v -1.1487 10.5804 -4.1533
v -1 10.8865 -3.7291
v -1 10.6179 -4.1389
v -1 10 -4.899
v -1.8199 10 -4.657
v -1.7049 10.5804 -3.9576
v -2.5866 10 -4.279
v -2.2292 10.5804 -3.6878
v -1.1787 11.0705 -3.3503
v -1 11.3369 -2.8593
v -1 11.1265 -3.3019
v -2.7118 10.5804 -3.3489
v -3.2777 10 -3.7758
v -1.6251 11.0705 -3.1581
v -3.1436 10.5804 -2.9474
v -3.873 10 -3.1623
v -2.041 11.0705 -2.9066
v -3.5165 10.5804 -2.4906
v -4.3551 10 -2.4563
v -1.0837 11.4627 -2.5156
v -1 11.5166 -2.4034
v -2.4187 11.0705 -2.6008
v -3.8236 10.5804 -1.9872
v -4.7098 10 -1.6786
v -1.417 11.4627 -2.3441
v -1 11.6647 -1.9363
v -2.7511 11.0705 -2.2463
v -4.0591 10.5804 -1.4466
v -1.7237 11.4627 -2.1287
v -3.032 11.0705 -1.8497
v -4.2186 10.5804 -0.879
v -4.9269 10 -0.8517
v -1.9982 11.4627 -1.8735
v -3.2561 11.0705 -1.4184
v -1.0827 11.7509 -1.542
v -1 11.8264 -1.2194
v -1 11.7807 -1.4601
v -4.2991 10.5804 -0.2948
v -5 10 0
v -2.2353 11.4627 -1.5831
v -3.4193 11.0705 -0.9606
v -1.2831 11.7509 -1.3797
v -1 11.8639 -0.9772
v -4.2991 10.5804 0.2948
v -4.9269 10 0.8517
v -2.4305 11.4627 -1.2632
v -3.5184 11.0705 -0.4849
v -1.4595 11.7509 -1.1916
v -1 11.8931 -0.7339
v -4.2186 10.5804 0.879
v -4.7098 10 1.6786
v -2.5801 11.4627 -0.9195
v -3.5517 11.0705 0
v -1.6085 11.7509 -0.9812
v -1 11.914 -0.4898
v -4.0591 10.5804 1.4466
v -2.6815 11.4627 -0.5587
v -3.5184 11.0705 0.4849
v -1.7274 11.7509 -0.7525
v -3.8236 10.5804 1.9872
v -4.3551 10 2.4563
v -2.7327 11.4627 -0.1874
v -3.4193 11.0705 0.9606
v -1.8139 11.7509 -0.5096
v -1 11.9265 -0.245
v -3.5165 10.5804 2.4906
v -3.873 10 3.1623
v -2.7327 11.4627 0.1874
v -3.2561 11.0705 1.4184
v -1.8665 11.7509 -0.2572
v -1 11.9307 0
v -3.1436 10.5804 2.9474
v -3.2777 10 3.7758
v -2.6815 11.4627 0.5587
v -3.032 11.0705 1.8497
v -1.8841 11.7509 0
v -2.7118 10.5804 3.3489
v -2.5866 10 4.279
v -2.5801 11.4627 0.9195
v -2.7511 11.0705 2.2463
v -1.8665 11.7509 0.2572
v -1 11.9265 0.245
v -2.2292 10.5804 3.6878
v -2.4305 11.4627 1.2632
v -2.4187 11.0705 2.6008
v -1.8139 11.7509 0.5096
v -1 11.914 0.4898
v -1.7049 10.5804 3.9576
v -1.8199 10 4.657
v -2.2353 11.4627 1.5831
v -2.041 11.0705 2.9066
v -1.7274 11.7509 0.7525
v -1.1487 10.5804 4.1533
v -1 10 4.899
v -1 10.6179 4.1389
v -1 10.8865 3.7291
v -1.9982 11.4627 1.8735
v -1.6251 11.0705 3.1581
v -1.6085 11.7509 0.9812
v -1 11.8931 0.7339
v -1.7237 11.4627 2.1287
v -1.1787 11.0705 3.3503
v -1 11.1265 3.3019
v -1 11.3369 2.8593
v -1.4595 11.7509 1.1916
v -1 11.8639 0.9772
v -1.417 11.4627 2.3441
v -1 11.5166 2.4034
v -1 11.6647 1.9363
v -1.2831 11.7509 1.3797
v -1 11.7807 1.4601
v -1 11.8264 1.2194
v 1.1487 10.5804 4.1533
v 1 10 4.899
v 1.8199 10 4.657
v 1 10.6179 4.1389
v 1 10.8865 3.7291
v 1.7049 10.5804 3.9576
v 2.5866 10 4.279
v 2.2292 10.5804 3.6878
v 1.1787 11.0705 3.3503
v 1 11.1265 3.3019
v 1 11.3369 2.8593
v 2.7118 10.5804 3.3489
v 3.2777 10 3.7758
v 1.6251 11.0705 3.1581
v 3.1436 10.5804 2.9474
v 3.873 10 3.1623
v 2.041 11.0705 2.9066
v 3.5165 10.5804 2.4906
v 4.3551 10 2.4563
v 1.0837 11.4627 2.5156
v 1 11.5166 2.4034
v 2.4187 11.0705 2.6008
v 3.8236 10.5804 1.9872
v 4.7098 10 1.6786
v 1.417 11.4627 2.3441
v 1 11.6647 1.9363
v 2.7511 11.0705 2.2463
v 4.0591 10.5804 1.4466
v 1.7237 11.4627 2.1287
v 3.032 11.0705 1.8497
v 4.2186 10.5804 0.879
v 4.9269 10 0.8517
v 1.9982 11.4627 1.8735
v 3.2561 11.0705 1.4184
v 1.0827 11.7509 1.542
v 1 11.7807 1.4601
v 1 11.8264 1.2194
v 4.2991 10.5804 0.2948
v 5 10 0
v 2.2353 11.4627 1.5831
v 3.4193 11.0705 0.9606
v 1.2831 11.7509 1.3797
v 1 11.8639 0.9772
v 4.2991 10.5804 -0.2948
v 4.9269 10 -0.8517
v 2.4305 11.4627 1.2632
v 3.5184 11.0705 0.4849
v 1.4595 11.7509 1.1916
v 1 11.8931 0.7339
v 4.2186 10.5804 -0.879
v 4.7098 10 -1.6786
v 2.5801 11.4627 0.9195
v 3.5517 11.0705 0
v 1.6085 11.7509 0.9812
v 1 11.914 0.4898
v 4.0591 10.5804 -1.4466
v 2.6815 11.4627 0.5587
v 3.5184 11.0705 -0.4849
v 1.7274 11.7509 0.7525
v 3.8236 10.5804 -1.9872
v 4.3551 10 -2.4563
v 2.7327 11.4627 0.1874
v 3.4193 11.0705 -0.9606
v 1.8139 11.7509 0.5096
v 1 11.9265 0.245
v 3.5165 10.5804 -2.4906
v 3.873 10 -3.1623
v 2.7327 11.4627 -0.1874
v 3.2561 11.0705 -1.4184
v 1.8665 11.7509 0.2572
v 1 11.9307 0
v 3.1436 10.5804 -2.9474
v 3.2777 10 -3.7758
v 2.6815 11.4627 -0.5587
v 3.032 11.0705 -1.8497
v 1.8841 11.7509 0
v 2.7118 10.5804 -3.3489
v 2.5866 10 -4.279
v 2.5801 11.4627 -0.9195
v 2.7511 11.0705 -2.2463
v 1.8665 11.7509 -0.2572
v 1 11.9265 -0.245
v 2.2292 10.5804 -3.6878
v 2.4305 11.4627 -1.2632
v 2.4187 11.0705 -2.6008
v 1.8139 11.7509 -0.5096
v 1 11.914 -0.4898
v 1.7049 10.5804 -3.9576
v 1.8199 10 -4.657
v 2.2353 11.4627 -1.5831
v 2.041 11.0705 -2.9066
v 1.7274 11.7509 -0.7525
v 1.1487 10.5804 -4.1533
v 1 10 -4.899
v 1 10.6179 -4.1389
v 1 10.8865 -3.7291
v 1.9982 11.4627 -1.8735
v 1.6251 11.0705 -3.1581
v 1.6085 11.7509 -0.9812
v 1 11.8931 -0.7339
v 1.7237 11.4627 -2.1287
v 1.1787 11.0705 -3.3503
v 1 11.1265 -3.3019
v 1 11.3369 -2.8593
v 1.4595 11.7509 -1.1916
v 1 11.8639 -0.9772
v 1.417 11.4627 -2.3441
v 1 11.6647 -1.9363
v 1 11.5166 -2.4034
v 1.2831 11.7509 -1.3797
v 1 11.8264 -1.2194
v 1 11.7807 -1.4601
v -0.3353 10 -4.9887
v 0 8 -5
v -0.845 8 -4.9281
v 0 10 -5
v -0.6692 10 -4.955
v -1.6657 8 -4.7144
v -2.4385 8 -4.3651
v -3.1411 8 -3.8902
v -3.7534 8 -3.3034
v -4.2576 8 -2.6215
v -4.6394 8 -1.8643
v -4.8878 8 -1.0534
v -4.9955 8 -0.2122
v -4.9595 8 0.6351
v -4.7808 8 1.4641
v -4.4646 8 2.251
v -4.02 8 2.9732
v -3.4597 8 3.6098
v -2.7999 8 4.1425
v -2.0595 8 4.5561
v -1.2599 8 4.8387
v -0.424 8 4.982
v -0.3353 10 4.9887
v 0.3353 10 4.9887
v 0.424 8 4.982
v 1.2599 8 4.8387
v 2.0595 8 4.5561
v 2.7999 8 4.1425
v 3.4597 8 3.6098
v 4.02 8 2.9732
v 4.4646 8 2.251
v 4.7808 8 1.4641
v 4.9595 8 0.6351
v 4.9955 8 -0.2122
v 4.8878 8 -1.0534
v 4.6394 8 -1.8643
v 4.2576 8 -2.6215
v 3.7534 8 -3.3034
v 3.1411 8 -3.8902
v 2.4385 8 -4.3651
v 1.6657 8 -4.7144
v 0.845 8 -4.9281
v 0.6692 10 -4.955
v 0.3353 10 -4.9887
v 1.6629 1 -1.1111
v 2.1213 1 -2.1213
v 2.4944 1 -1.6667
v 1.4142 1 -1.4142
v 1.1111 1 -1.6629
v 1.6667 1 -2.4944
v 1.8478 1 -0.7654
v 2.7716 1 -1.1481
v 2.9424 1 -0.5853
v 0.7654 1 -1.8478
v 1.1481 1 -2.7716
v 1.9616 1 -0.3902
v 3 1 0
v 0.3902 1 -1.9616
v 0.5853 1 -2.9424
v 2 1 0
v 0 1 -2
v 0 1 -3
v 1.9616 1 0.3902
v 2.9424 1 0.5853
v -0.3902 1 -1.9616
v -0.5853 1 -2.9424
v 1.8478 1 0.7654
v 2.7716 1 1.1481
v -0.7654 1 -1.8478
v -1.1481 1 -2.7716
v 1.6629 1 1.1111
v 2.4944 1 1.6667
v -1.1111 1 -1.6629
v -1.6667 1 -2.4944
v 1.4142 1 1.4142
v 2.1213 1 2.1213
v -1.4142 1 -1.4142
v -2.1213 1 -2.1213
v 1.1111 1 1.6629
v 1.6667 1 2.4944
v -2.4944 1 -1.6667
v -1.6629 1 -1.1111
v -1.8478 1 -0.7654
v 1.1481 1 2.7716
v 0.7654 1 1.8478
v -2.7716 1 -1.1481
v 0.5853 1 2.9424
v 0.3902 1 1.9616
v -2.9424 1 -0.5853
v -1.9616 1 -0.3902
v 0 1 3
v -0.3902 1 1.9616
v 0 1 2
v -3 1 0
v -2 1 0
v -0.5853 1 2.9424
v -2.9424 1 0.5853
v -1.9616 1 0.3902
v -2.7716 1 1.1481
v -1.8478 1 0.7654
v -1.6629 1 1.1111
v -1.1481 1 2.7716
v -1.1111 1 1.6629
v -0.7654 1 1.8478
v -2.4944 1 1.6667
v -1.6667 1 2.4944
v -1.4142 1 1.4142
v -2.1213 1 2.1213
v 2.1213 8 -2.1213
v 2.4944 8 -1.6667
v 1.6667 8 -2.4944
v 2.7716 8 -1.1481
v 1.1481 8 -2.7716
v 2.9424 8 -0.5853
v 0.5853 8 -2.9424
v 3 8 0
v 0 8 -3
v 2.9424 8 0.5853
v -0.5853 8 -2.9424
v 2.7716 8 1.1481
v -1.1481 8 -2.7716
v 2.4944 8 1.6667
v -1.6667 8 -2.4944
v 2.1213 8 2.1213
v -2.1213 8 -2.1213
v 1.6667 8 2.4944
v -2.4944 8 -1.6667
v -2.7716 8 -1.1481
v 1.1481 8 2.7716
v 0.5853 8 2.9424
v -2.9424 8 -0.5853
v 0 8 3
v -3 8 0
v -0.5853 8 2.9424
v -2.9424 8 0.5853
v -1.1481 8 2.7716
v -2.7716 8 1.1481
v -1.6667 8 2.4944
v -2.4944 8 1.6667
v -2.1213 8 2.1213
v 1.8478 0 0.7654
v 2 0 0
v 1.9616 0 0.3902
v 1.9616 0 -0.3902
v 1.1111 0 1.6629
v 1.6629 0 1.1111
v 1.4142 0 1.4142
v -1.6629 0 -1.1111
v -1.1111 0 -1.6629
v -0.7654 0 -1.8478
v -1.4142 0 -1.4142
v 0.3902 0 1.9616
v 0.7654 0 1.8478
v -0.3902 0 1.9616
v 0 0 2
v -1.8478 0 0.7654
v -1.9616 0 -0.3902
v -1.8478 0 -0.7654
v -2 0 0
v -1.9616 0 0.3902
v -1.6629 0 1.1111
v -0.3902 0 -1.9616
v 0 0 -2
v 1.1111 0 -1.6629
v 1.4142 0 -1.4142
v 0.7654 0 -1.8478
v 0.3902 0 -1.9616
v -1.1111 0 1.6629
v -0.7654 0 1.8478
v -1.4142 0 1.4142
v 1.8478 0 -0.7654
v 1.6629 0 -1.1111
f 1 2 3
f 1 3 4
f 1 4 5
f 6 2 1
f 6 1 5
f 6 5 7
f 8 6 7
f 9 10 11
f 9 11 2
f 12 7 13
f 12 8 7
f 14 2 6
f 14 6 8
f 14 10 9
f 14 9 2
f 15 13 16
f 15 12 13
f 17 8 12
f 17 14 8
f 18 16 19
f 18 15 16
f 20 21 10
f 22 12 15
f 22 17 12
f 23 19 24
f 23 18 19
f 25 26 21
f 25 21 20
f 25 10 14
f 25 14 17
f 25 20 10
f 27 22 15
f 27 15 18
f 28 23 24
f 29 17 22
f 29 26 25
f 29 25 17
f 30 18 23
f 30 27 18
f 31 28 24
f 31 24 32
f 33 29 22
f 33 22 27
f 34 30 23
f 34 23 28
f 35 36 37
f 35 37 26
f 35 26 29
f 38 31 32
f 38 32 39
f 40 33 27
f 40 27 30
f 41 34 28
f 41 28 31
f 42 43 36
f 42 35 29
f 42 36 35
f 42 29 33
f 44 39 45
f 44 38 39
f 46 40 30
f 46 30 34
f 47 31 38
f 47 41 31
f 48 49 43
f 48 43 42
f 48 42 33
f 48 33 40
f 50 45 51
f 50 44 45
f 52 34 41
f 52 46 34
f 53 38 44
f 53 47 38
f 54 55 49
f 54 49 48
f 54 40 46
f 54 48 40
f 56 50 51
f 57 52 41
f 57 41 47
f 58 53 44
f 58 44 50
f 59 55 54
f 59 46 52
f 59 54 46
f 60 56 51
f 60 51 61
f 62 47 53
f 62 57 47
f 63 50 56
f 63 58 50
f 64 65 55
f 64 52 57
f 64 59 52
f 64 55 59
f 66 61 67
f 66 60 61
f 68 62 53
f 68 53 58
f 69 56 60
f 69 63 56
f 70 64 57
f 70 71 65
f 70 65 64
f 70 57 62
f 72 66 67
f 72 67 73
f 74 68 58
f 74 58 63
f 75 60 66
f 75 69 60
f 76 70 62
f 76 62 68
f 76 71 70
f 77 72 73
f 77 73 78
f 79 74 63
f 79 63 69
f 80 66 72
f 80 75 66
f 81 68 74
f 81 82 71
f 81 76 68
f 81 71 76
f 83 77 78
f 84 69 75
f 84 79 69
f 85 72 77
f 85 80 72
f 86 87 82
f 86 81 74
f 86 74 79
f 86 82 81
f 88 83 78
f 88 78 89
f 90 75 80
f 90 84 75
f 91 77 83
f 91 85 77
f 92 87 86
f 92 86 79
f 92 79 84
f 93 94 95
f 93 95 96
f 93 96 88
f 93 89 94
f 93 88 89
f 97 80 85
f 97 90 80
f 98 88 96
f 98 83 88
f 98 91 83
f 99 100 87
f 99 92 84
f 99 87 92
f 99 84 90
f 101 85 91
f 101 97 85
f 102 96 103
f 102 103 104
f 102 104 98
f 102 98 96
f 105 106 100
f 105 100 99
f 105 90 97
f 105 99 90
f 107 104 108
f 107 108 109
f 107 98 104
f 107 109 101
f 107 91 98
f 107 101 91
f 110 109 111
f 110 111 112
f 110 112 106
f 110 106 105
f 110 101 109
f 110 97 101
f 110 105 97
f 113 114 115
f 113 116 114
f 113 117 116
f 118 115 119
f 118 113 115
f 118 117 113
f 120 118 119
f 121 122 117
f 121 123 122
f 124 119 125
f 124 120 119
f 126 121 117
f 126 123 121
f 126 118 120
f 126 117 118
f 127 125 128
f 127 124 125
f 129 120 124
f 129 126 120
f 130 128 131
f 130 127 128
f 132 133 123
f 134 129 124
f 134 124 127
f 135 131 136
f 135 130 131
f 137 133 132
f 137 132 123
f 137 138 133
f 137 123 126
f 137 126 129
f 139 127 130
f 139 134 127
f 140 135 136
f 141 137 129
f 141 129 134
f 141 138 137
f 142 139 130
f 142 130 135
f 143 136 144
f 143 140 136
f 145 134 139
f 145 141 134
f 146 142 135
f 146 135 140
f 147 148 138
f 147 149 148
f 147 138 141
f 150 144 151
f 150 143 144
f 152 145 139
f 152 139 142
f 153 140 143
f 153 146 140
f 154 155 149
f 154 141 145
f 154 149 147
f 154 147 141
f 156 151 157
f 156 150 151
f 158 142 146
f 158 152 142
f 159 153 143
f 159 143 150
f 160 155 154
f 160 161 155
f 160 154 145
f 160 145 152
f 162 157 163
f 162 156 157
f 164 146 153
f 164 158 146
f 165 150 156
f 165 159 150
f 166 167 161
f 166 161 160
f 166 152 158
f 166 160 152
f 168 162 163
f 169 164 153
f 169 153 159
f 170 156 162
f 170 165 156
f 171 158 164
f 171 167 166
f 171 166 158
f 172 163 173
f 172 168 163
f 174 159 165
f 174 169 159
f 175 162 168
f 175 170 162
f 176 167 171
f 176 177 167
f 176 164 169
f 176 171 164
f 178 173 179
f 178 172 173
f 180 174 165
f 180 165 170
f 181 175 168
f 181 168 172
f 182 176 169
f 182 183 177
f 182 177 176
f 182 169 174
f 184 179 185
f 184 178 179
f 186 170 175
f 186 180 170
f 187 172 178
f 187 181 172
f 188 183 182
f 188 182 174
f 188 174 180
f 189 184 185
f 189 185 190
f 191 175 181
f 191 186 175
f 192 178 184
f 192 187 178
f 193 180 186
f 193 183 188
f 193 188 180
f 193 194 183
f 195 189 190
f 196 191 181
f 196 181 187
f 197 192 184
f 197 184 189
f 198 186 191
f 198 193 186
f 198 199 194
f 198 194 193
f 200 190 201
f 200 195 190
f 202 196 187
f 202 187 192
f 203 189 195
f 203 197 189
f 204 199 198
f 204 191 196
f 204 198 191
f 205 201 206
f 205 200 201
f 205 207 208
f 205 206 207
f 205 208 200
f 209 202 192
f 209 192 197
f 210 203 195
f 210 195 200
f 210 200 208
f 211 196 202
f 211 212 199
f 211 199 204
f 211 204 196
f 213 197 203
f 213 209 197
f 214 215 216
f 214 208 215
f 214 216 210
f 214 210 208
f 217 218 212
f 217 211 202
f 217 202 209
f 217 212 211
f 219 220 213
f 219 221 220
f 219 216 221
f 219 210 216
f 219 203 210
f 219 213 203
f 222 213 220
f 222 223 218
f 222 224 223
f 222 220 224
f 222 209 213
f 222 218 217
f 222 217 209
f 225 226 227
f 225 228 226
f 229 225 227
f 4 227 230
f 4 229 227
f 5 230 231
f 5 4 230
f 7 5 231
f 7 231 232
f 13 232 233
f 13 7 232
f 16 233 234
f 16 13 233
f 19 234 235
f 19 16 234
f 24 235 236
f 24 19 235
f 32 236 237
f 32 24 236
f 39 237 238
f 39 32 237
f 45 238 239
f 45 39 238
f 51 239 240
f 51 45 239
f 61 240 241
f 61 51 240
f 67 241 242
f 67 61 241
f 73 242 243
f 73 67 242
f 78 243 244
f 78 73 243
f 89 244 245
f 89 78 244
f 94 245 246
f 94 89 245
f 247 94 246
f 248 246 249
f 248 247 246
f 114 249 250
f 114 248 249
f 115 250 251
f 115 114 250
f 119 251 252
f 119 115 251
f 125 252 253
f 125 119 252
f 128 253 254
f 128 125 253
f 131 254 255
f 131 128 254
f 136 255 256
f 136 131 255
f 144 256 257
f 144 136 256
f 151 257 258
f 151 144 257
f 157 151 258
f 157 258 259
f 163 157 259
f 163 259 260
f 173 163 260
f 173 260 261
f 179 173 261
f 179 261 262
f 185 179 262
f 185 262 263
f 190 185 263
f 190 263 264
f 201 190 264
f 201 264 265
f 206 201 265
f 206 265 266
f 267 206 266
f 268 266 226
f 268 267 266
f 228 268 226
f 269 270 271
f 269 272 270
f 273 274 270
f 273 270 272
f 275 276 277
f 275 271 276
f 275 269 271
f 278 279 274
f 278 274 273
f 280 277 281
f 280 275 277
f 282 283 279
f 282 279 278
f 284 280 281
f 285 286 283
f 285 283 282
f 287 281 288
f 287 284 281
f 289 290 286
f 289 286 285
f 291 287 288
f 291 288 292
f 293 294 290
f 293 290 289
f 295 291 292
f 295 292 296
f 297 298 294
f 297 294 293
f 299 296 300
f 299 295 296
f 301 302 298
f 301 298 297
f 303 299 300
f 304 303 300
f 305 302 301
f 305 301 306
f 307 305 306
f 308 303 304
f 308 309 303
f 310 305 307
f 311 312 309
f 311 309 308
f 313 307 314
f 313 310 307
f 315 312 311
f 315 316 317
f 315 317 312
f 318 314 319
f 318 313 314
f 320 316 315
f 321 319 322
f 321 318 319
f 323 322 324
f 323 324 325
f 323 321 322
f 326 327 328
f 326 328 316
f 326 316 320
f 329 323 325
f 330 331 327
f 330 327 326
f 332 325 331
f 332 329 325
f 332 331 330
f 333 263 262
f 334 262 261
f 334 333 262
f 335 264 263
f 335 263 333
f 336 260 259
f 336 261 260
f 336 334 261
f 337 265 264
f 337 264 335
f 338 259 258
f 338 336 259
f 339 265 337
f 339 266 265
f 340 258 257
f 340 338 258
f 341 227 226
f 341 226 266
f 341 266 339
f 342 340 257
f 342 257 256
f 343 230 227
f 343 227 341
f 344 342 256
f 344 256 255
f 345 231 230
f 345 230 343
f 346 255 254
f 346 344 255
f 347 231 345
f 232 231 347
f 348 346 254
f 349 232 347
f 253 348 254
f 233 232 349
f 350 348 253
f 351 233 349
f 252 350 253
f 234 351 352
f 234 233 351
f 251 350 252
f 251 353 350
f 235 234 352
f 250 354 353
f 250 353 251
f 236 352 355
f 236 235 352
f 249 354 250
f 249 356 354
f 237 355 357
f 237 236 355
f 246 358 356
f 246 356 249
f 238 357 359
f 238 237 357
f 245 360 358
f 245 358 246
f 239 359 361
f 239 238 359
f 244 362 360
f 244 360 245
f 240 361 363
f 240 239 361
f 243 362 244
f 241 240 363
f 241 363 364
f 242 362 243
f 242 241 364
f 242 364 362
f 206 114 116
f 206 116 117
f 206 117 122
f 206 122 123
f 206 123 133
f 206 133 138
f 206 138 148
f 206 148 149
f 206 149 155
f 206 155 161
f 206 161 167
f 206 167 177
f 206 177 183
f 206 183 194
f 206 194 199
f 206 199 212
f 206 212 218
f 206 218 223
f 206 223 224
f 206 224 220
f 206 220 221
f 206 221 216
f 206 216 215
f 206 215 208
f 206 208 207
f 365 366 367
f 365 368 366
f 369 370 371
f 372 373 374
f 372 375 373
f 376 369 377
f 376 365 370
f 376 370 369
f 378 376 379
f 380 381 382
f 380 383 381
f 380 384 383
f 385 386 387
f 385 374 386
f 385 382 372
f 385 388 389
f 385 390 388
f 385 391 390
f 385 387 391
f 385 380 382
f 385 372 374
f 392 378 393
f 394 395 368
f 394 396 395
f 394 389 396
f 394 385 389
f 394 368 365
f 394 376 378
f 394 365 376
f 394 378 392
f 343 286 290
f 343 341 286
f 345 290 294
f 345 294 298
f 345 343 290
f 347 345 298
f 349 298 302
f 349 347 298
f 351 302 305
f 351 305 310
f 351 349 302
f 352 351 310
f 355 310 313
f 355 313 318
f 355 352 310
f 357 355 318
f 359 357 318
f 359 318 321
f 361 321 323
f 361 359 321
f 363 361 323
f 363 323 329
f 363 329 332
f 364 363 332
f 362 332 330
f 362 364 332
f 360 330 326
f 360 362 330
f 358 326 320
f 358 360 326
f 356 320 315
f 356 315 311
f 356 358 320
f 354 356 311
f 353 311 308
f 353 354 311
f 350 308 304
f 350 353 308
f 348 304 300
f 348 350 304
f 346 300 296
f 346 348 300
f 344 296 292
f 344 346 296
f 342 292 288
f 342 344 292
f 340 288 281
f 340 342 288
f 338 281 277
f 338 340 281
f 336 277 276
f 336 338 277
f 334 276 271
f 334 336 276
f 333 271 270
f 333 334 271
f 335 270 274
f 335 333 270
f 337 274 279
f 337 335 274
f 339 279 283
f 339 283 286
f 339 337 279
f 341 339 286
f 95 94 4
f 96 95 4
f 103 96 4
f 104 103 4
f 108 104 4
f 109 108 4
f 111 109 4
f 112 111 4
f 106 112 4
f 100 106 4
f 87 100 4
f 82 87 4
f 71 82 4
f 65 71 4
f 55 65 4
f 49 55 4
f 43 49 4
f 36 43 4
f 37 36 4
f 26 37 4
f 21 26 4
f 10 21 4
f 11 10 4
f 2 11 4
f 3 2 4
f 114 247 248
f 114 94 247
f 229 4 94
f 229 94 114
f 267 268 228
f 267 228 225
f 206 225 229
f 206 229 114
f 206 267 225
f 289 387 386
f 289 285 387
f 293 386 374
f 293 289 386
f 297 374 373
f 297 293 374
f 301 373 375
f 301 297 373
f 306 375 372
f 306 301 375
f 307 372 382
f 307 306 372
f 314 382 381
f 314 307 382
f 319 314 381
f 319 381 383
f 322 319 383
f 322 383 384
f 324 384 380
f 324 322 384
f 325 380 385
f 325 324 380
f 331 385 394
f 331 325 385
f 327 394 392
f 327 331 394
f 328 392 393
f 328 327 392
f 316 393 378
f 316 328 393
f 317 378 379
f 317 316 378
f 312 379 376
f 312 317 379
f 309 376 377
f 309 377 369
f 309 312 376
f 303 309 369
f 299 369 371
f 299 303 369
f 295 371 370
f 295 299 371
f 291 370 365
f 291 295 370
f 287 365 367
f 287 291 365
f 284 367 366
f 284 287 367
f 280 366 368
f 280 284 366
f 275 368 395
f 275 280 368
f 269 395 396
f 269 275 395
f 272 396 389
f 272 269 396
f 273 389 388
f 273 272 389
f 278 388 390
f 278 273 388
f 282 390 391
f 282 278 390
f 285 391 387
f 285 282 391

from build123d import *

# Parameters (mm, degrees)
DOME4_FACE_RADIUS = 5
DOME4_HEIGHT      = 2
SKETCH3_W         = 2
SKETCH3_H         = 11.201368044
EXTRUDE3_DEPTH    = 2


with BuildPart() as part:
    # Sketch1 → Revolve3 (revolve)
    with BuildSketch(Plane.XY, mode=Mode.PRIVATE) as revolve3_sk:
        Polygon((0, 0), (-2, 0), (-2, 1), (-3, 1), (-3, 8), (-5, 8), (-5, 10), (0, 10), align=None)
    revolve(revolve3_sk.sketch.rotate(Axis((0, 0, 0), (0, 1, 0)), 270), axis=Axis((0, 0, 0), (0, 1, 0)))

    # Dome4: a dome of height H over a round flat face of radius A is a cap of a sphere of radius (A * A + H * H) / (2 * H)
    dome4_r = (DOME4_FACE_RADIUS * DOME4_FACE_RADIUS + DOME4_HEIGHT * DOME4_HEIGHT) / (2 * DOME4_HEIGHT)
    dome4_base = Plane((0, 10, 0), z_dir=(0, 1, 0))
    with Locations(dome4_base.offset(DOME4_HEIGHT - dome4_r)):
        dome4_ball = Sphere(dome4_r, mode=Mode.PRIVATE)
    add(split(dome4_ball, bisect_by=dome4_base, keep=Keep.TOP, mode=Mode.PRIVATE))

    # Sketch3 → Extrude3 (cut)
    with BuildSketch(Plane(origin=(0, 10, 0), x_dir=(1, 0, 0), z_dir=(0, 1, 0))):
        Rectangle(SKETCH3_W, SKETCH3_H)
    extrude(amount=EXTRUDE3_DEPTH, mode=Mode.SUBTRACT)


solid = part.part
